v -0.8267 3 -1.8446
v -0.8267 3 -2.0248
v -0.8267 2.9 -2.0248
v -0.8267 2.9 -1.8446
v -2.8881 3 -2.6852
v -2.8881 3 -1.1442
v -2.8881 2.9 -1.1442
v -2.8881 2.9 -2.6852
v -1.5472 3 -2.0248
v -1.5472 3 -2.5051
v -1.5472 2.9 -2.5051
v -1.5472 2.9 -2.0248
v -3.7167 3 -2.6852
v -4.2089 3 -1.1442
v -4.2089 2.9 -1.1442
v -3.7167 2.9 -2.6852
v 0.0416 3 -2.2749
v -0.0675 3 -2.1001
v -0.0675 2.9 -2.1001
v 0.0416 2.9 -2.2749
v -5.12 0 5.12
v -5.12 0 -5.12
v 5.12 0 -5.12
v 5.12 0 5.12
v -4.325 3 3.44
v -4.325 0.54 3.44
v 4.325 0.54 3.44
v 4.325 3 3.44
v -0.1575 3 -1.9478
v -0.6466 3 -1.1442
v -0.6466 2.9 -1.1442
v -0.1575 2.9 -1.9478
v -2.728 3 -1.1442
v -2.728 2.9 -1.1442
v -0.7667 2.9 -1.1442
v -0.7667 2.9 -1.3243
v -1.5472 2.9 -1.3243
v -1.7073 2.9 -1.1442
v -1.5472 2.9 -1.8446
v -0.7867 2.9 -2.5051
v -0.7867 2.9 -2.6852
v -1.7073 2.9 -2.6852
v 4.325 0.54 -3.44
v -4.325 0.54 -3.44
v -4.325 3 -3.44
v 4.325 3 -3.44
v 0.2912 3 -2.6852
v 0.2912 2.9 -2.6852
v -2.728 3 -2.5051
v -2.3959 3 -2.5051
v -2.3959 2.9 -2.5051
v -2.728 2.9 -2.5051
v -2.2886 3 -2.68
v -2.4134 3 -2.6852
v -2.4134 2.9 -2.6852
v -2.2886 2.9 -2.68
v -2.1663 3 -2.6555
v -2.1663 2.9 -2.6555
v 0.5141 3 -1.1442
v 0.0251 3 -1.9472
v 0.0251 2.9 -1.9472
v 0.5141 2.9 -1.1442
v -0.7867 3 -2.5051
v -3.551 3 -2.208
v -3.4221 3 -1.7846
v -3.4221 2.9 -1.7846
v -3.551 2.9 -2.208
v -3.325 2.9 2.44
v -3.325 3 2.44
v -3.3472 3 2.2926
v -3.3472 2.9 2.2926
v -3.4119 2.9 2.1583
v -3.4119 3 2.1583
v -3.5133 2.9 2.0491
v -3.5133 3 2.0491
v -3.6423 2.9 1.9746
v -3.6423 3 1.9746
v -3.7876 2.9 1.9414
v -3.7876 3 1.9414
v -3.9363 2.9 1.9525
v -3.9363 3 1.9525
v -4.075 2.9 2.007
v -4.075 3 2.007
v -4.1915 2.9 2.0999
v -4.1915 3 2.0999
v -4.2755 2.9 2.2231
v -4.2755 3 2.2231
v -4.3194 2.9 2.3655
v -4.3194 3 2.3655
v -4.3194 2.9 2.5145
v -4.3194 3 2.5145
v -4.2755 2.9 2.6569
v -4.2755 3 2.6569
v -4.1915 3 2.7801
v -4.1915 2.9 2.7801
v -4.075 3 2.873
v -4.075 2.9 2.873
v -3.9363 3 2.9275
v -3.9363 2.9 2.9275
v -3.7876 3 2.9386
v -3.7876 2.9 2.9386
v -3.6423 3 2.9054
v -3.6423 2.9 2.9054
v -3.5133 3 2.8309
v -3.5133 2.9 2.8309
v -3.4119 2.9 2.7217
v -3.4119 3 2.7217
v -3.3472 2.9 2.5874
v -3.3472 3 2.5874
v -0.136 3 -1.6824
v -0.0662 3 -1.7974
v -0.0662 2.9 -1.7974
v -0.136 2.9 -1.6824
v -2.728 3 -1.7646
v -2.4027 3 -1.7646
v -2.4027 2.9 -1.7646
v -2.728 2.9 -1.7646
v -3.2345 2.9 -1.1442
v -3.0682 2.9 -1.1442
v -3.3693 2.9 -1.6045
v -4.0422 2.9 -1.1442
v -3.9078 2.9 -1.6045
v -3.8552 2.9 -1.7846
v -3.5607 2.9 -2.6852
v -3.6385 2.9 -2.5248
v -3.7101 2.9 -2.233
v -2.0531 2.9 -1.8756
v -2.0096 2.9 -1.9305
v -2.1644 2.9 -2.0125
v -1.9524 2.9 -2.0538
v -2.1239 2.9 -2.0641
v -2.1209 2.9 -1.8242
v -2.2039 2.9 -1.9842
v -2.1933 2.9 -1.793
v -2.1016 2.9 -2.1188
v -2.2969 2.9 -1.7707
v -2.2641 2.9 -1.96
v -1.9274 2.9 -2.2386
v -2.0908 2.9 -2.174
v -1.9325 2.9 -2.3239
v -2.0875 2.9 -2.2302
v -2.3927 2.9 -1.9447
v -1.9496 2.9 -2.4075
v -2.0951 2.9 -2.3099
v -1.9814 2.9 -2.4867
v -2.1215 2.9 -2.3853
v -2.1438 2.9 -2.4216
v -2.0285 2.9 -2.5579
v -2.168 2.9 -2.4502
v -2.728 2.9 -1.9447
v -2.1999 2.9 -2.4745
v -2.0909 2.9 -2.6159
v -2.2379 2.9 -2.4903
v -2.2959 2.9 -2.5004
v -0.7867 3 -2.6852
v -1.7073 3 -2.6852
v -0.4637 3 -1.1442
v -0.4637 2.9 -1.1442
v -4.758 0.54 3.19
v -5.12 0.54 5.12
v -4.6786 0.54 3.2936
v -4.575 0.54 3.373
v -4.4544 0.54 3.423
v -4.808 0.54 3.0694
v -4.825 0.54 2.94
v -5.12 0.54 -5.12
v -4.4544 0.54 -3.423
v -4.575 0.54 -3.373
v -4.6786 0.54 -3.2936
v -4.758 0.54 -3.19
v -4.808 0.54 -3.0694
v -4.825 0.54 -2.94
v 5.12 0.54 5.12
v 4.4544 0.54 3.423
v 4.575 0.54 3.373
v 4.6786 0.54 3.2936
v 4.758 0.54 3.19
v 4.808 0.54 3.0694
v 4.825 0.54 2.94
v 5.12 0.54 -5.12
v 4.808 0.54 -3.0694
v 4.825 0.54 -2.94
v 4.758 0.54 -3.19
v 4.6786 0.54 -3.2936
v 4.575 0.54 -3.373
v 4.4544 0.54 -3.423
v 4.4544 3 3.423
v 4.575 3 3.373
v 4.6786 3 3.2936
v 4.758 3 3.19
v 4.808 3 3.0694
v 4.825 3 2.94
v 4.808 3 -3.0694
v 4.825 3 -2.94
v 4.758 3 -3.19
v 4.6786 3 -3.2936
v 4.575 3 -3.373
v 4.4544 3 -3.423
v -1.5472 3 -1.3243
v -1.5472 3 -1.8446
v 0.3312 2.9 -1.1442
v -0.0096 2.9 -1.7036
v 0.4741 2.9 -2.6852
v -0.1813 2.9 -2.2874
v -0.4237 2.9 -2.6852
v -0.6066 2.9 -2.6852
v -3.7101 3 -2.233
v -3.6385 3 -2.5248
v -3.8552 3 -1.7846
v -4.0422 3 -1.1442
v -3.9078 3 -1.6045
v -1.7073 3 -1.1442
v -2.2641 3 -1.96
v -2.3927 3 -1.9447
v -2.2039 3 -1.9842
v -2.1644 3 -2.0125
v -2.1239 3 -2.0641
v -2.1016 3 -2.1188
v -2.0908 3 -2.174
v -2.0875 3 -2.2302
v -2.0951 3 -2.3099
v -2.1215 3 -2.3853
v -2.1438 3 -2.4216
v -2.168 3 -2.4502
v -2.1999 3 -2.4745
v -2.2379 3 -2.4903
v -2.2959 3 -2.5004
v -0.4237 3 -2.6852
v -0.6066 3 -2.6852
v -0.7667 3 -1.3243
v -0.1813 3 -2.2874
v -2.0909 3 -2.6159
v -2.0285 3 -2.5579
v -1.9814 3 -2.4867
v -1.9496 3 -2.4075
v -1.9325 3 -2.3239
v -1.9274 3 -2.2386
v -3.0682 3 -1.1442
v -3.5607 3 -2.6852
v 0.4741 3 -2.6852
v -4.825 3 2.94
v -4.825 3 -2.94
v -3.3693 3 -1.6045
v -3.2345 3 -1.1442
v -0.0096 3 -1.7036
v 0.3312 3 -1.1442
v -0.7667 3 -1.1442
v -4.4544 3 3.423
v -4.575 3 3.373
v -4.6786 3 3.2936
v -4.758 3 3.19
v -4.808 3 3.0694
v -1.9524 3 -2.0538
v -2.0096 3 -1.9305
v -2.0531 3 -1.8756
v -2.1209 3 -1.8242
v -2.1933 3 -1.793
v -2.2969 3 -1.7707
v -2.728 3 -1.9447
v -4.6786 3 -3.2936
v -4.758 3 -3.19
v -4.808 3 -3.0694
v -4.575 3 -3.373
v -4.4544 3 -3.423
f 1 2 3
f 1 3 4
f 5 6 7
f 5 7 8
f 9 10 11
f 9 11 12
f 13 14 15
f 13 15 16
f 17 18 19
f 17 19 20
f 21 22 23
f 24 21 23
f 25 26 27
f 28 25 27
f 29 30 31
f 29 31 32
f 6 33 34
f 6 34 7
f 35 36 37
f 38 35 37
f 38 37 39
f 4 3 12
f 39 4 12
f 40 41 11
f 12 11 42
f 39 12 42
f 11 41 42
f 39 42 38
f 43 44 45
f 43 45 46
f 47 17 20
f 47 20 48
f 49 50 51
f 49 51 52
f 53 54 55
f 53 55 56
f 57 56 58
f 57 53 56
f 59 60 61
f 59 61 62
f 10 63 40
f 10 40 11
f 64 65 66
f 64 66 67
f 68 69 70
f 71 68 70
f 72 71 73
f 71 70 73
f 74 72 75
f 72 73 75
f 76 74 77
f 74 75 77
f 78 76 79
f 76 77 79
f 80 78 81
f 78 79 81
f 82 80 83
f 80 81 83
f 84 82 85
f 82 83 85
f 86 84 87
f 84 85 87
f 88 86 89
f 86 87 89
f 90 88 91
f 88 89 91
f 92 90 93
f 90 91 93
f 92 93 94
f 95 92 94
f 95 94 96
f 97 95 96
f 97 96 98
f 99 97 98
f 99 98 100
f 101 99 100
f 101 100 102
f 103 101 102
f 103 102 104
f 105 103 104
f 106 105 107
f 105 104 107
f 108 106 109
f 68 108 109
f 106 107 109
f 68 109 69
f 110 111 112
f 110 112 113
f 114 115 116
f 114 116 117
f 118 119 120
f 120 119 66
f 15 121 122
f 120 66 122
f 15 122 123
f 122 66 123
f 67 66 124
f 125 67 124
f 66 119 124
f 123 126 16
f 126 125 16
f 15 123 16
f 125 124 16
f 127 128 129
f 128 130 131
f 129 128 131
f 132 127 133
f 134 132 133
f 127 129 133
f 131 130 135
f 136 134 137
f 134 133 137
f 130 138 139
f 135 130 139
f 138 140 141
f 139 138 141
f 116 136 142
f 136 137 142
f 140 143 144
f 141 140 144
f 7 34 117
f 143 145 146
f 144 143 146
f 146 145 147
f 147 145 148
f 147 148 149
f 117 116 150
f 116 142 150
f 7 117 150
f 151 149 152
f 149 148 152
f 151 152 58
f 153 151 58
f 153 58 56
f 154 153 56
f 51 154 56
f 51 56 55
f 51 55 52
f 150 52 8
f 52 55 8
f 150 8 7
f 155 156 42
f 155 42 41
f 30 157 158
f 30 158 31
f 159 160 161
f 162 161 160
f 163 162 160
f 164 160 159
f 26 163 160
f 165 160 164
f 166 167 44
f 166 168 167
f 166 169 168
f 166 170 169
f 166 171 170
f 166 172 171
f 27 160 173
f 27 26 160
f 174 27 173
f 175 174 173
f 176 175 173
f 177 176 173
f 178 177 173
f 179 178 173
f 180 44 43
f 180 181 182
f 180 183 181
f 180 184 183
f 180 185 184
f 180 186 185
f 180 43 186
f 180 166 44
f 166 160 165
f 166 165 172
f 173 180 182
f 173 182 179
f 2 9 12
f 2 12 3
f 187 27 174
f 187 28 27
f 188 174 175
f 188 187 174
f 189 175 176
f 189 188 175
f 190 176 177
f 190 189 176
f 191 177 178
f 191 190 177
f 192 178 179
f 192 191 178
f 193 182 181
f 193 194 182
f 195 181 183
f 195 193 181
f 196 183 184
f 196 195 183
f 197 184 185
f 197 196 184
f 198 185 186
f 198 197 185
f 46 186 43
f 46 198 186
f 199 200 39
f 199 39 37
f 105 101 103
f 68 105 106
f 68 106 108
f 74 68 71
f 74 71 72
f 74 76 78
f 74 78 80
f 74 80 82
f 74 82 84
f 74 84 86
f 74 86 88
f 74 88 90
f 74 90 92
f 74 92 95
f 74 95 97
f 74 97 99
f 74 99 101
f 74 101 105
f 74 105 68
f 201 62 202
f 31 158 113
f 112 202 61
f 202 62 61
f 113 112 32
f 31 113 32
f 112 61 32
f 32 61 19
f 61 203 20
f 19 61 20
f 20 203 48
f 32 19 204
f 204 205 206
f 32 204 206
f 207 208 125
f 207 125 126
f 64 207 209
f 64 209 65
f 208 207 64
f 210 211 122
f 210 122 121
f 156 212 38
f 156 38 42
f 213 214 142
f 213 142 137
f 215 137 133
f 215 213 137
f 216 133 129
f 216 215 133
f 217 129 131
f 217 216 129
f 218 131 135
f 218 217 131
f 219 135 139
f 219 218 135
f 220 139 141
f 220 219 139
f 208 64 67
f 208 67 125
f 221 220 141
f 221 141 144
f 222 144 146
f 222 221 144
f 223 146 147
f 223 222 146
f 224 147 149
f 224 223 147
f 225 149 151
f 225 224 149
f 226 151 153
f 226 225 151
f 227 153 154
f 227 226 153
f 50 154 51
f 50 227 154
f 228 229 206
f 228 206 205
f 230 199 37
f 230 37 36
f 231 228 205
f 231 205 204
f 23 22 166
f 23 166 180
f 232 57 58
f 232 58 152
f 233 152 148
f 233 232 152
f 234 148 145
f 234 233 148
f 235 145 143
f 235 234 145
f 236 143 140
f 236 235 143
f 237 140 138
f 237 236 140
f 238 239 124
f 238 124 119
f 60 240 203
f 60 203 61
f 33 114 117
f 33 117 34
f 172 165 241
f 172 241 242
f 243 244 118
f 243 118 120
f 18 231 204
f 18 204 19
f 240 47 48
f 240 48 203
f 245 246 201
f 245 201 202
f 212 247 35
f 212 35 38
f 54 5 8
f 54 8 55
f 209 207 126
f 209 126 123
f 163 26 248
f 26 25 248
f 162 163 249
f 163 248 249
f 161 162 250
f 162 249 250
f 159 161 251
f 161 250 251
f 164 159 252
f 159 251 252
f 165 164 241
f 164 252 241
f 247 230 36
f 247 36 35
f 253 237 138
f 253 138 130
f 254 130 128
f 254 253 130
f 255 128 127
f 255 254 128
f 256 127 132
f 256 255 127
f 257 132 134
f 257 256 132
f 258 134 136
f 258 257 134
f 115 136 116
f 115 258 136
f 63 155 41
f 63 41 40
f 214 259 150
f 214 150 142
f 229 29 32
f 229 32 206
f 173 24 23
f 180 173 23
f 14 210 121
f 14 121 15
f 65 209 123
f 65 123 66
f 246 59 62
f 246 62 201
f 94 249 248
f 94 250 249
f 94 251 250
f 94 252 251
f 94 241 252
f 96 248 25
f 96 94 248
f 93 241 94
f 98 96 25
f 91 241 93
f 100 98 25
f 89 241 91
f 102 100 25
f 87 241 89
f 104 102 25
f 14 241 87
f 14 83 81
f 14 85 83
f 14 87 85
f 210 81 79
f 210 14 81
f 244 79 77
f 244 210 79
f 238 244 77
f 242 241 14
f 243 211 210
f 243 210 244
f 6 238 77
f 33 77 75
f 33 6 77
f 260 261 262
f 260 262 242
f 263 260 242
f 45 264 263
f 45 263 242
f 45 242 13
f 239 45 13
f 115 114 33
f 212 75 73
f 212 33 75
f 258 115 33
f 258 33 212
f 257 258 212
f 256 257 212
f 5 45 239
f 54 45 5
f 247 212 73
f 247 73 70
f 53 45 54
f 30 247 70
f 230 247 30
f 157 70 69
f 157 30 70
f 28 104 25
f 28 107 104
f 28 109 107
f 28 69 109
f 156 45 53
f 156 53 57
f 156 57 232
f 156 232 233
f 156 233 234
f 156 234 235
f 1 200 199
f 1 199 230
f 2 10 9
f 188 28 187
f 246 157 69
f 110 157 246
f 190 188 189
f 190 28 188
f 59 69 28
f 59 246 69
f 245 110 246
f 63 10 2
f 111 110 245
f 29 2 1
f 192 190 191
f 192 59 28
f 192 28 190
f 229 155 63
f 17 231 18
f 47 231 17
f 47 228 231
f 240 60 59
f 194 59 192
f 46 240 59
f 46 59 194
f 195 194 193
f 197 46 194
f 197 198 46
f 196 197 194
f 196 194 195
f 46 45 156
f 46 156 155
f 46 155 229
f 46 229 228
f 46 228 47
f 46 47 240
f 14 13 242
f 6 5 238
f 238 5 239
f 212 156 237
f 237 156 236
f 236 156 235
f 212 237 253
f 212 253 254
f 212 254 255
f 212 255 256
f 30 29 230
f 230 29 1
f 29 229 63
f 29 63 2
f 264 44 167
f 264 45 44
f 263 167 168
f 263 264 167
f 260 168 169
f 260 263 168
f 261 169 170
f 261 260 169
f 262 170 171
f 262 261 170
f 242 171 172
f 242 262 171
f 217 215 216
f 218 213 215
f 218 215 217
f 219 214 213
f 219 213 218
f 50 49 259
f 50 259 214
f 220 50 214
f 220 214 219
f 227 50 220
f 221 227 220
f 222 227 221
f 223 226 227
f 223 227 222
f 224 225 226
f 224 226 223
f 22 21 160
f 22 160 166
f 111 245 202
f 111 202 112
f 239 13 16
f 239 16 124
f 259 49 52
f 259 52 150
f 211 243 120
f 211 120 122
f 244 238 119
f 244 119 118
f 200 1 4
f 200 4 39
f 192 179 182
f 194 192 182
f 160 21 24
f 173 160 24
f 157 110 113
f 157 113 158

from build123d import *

# Parameters (mm, degrees)
SKETCH1_W           = 10.24
SKETCH1_H           = 10.24
BOSS_EXTRUDE1_DEPTH = 0.54
SKETCH2_W           = 9.65
SKETCH2_H           = 6.88
BOSS_EXTRUDE2_DEPTH = 2.46
FILLET1_R           = 0.5
SKETCH3_R           = 0.5
CUT_EXTRUDE1_DEPTH  = 0.1
CUT_EXTRUDE2_DEPTH  = 0.1


with BuildPart() as part:
    # Sketch1 → Boss-Extrude1 (new body)
    with BuildSketch(Plane(origin=(0, 0, 0), x_dir=(1, 0, 0), z_dir=(0, 1, 0))):
        Rectangle(SKETCH1_W, SKETCH1_H)
    extrude(amount=BOSS_EXTRUDE1_DEPTH)

    # Sketch2 → Boss-Extrude2 (add)
    with BuildSketch(Plane(origin=(0, 0.54, 0), x_dir=(1, 0, 0), z_dir=(0, 1, 0))):
        Rectangle(SKETCH2_W, SKETCH2_H)
    extrude(amount=BOSS_EXTRUDE2_DEPTH)

    # Fillet1
    fillet1_edges = [part.edges().sort_by_distance(p)[0] for p in [
        (4.825, 1.77, 3.44),
        (4.825, 1.77, -3.44),
        (-4.825, 1.77, -3.44),
        (-4.825, 1.77, 3.44),
    ]]
    fillet(fillet1_edges, radius=FILLET1_R)

    # Sketch3 → Cut-Extrude1 (cut)
    with BuildSketch(Plane(origin=(0, 3, 0), x_dir=(1, 0, 0), z_dir=(0, 1, 0))):
        with Locations((-3.825, -2.44)):
            Circle(SKETCH3_R)
    extrude(amount=-CUT_EXTRUDE1_DEPTH, mode=Mode.SUBTRACT)

    # Sketch4 → Cut-Extrude2 (cut)
    with BuildSketch(Plane(origin=(0, 3, 0), x_dir=(1, 0, 0), z_dir=(0, 1, 0))):
        Polygon((-4.208905933, 1.144195858), (-3.716714341, 2.685187069), (-3.560676473, 2.685187069), (-3.06817218, 1.144195858), (-3.234529186, 1.144195858), (-3.369303376, 1.604491934), (-3.907774737, 1.604491934), (-4.042236227, 1.144195858), align=None)
        with BuildLine():
            Line((-3.855240946, 1.78460779), (-3.422149869, 1.78460779))
            Line((-3.422149869, 1.78460779), (-3.550982738, 2.208005131))
            add(Edge.make_bspline(
                [(-3.550982738, 2.208005131), (-3.555802408, 2.22384126), (-3.565212111, 2.254758994), (-3.578537108, 2.300032071), (-3.591326078, 2.342972738), (-3.602250322, 2.38388053), (-3.61311318, 2.422223196), (-3.622481656, 2.458427427), (-3.630891424, 2.492313544), (-3.636057432, 2.514238953), (-3.638539057, 2.524771385)],
                knots=[0, 0, 0, 0, 4.9659e-05, 9.6953e-05, 0.000141582, 0.000184064, 0.000223969, 0.000261133, 0.000296247, 0.00032871, 0.00032871, 0.00032871, 0.00032871], degree=3))
            add(Edge.make_bspline(
                [(-3.638539057, 2.524771385), (-3.643044276, 2.500238484), (-3.65204873, 2.451205272), (-3.668927225, 2.378161214), (-3.687705063, 2.305248967), (-3.702651529, 2.257146174), (-3.710147617, 2.233021222)],
                knots=[0, 0, 0, 0, 7.482e-05, 0.00014954, 0.000224855, 0.000300632, 0.000300632, 0.000300632, 0.000300632], degree=3))
            Line((-3.710147617, 2.233021222), (-3.855240946, 1.78460779))
        make_face(mode=Mode.SUBTRACT)
        with BuildLine():
            Line((-2.888056324, 1.144195858), (-2.888056324, 2.685187069))
            Line((-2.888056324, 2.685187069), (-2.413375996, 2.685187069))
            add(Edge.make_bspline(
                [(-2.413375996, 2.685187069), (-2.399822743, 2.685199787), (-2.373748311, 2.685224254), (-2.336020957, 2.683378466), (-2.30094543, 2.681513344), (-2.268644767, 2.677914478), (-2.239094529, 2.673984648), (-2.212324896, 2.66907385), (-2.188330523, 2.662867435), (-2.173405243, 2.657853313), (-2.166342096, 2.655480461)],
                knots=[0, 0, 0, 0, 4.0652e-05, 7.8209e-05, 0.0001133, 0.000146002, 0.000175676, 0.000202722, 0.000227599, 0.000249948, 0.000249948, 0.000249948, 0.000249948], degree=3))
            add(Edge.make_bspline(
                [(-2.166342096, 2.655480461), (-2.15739835, 2.652018743), (-2.139532052, 2.645103513), (-2.114366349, 2.631451435), (-2.09035999, 2.616070999), (-2.067785044, 2.598561502), (-2.046773915, 2.578653074), (-2.026997713, 2.556783142), (-2.008849339, 2.532502116), (-1.992128119, 2.506327155), (-1.976558078, 2.478522333), (-1.963702465, 2.448747644), (-1.952154302, 2.417630839), (-1.943367912, 2.384807465), (-1.935942576, 2.3505097), (-1.931213224, 2.314633597), (-1.927842425, 2.277176403), (-1.92757514, 2.251687241), (-1.927438426, 2.238649843)],
                knots=[0, 0, 0, 0, 2.8745e-05, 5.7421e-05, 8.5698e-05, 0.000114221, 0.000142979, 0.000172428, 0.000202572, 0.000233798, 0.000265568, 0.000298048, 0.000330989, 0.000365052, 0.000399887, 0.000436194, 0.000473536, 0.000512635, 0.000512635, 0.000512635, 0.000512635], degree=3))
            add(Edge.make_bspline(
                [(-1.927438426, 2.238649843), (-1.927703132, 2.221543206), (-1.928220835, 2.188086636), (-1.93330388, 2.139152317), (-1.941751736, 2.092755631), (-1.953277936, 2.048673687), (-1.968247434, 2.006973056), (-1.986783863, 1.967763319), (-2.008529273, 1.930904056), (-2.033354788, 1.89632649), (-2.062609276, 1.864852564), (-2.097135287, 1.83792685), (-2.136198408, 1.814898294), (-2.180286283, 1.796594194), (-2.228949187, 1.781809429), (-2.282628295, 1.771730453), (-2.3411162, 1.765892858), (-2.381674975, 1.765038653), (-2.402744157, 1.764594917)],
                knots=[0, 0, 0, 0, 5.1307e-05, 0.000100344, 0.000147388, 0.000192669, 0.000236884, 0.000280107, 0.000322581, 0.000365113, 0.000407588, 0.000451004, 0.000495999, 0.000543218, 0.000593866, 0.000648324, 0.000706789, 0.000769993, 0.000769993, 0.000769993, 0.000769993], degree=3))
            Line((-2.402744157, 1.764594917), (-2.727953341, 1.764594917))
            Line((-2.727953341, 1.764594917), (-2.727953341, 1.144195858))
            Line((-2.727953341, 1.144195858), (-2.888056324, 1.144195858))
        make_face()
        with BuildLine():
            Line((-2.727953341, 1.944710773), (-2.392737721, 1.944710773))
            add(Edge.make_bspline(
                [(-2.392737721, 1.944710773), (-2.380016461, 1.944996579), (-2.355368886, 1.945550331), (-2.319593959, 1.948503929), (-2.28645598, 1.954137106), (-2.255965679, 1.961851391), (-2.228207938, 1.971910844), (-2.203044284, 1.984006949), (-2.180618389, 1.998565987), (-2.160576979, 2.015206906), (-2.143495605, 2.034541806), (-2.128130148, 2.05560326), (-2.115669137, 2.079385756), (-2.105485872, 2.105324963), (-2.097214244, 2.133336313), (-2.091756565, 2.163637248), (-2.08826807, 2.196145263), (-2.087788442, 2.21862743), (-2.087541409, 2.230206912)],
                knots=[0, 0, 0, 0, 3.817e-05, 7.3955e-05, 0.000107576, 0.000138899, 0.000168179, 0.00019601, 0.000222464, 0.000248208, 0.000273892, 0.000299664, 0.000326244, 0.000354174, 0.000383168, 0.000413711, 0.000446413, 0.000481145, 0.000481145, 0.000481145, 0.000481145], degree=3))
            add(Edge.make_bspline(
                [(-2.087541409, 2.230206912), (-2.08789706, 2.245247803), (-2.088585266, 2.274352792), (-2.095703866, 2.316217414), (-2.106715605, 2.354836551), (-2.122831996, 2.389433378), (-2.141679929, 2.419771411), (-2.162318289, 2.445723404), (-2.185368747, 2.466112503), (-2.206821105, 2.478820504), (-2.225660971, 2.486835174), (-2.242449858, 2.491781091), (-2.261836205, 2.495665981), (-2.283750042, 2.499067941), (-2.30814868, 2.501936461), (-2.335078678, 2.50362652), (-2.364580349, 2.505013397), (-2.385126647, 2.505051368), (-2.395864732, 2.505071213)],
                knots=[0, 0, 0, 0, 4.5082e-05, 8.7237e-05, 0.000127012, 0.000165211, 0.000201307, 0.000233979, 0.000264337, 0.000293082, 0.000308356, 0.000325668, 0.000345477, 0.000367635, 0.000392187, 0.000419145, 0.000448566, 0.000480775, 0.000480775, 0.000480775, 0.000480775], degree=3))
            Line((-2.395864732, 2.505071213), (-2.727953341, 2.505071213))
            Line((-2.727953341, 2.505071213), (-2.727953341, 1.944710773))
        make_face(mode=Mode.SUBTRACT)
        Polygon((-1.707296825, 1.144195858), (-1.707296825, 2.685187069), (-0.786704673, 2.685187069), (-0.786704673, 2.505071213), (-1.547193842, 2.505071213), (-1.547193842, 2.024762264), (-0.826730419, 2.024762264), (-0.826730419, 1.844646408), (-1.547193842, 1.844646408), (-1.547193842, 1.324311714), (-0.7666918, 1.324311714), (-0.7666918, 1.144195858), align=None)
        with BuildLine():
            Line((-0.646614563, 1.144195858), (-0.157549982, 1.947837784))
            Line((-0.157549982, 1.947837784), (-0.606588817, 2.685187069))
            Line((-0.606588817, 2.685187069), (-0.423658651, 2.685187069))
            Line((-0.423658651, 2.685187069), (-0.181315269, 2.28743122))
            add(Edge.make_bspline(
                [(-0.181315269, 2.28743122), (-0.169736699, 2.268361701), (-0.148036169, 2.232621651), (-0.117649456, 2.182287392), (-0.091062059, 2.139057874), (-0.074879604, 2.112326527), (-0.067492054, 2.100123238)],
                knots=[0, 0, 0, 0, 6.6928e-05, 0.000125437, 0.000176385, 0.000219181, 0.000219181, 0.000219181, 0.000219181], degree=3))
            add(Edge.make_bspline(
                [(-0.067492054, 2.100123238), (-0.049678986, 2.127999568), (-0.012690335, 2.185884479), (0.02309097, 2.244523598), (0.041640643, 2.274923175)],
                knots=[0, 0, 0, 0, 9.9242e-05, 0.000206075, 0.000206075, 0.000206075, 0.000206075], degree=3))
            Line((0.041640643, 2.274923175), (0.291176152, 2.685187069))
            Line((0.291176152, 2.685187069), (0.474106318, 2.685187069))
            Line((0.474106318, 2.685187069), (0.025067483, 1.947212382))
            Line((0.025067483, 1.947212382), (0.514132064, 1.144195858))
            Line((0.514132064, 1.144195858), (0.331201898, 1.144195858))
            Line((0.331201898, 1.144195858), (-0.009642343, 1.703618195))
            add(Edge.make_bspline(
                [(-0.009642343, 1.703618195), (-0.01890825, 1.719051357), (-0.037706972, 1.750362242), (-0.056640217, 1.781591969), (-0.06624125, 1.797428536)],
                knots=[0, 0, 0, 0, 5.4003e-05, 0.000109562, 0.000109562, 0.000109562, 0.000109562], degree=3))
            add(Edge.make_bspline(
                [(-0.06624125, 1.797428536), (-0.074099113, 1.784632259), (-0.088514391, 1.761157446), (-0.107567841, 1.72889146), (-0.123536239, 1.703682546), (-0.132254181, 1.688732713), (-0.135973603, 1.682354517)],
                knots=[0, 0, 0, 0, 4.5049e-05, 8.2642e-05, 0.000112407, 0.000134556, 0.000134556, 0.000134556, 0.000134556], degree=3))
            Line((-0.135973603, 1.682354517), (-0.463684397, 1.144195858))
            Line((-0.463684397, 1.144195858), (-0.646614563, 1.144195858))
        make_face()
    extrude(amount=-CUT_EXTRUDE2_DEPTH, mode=Mode.SUBTRACT)


solid = part.part
